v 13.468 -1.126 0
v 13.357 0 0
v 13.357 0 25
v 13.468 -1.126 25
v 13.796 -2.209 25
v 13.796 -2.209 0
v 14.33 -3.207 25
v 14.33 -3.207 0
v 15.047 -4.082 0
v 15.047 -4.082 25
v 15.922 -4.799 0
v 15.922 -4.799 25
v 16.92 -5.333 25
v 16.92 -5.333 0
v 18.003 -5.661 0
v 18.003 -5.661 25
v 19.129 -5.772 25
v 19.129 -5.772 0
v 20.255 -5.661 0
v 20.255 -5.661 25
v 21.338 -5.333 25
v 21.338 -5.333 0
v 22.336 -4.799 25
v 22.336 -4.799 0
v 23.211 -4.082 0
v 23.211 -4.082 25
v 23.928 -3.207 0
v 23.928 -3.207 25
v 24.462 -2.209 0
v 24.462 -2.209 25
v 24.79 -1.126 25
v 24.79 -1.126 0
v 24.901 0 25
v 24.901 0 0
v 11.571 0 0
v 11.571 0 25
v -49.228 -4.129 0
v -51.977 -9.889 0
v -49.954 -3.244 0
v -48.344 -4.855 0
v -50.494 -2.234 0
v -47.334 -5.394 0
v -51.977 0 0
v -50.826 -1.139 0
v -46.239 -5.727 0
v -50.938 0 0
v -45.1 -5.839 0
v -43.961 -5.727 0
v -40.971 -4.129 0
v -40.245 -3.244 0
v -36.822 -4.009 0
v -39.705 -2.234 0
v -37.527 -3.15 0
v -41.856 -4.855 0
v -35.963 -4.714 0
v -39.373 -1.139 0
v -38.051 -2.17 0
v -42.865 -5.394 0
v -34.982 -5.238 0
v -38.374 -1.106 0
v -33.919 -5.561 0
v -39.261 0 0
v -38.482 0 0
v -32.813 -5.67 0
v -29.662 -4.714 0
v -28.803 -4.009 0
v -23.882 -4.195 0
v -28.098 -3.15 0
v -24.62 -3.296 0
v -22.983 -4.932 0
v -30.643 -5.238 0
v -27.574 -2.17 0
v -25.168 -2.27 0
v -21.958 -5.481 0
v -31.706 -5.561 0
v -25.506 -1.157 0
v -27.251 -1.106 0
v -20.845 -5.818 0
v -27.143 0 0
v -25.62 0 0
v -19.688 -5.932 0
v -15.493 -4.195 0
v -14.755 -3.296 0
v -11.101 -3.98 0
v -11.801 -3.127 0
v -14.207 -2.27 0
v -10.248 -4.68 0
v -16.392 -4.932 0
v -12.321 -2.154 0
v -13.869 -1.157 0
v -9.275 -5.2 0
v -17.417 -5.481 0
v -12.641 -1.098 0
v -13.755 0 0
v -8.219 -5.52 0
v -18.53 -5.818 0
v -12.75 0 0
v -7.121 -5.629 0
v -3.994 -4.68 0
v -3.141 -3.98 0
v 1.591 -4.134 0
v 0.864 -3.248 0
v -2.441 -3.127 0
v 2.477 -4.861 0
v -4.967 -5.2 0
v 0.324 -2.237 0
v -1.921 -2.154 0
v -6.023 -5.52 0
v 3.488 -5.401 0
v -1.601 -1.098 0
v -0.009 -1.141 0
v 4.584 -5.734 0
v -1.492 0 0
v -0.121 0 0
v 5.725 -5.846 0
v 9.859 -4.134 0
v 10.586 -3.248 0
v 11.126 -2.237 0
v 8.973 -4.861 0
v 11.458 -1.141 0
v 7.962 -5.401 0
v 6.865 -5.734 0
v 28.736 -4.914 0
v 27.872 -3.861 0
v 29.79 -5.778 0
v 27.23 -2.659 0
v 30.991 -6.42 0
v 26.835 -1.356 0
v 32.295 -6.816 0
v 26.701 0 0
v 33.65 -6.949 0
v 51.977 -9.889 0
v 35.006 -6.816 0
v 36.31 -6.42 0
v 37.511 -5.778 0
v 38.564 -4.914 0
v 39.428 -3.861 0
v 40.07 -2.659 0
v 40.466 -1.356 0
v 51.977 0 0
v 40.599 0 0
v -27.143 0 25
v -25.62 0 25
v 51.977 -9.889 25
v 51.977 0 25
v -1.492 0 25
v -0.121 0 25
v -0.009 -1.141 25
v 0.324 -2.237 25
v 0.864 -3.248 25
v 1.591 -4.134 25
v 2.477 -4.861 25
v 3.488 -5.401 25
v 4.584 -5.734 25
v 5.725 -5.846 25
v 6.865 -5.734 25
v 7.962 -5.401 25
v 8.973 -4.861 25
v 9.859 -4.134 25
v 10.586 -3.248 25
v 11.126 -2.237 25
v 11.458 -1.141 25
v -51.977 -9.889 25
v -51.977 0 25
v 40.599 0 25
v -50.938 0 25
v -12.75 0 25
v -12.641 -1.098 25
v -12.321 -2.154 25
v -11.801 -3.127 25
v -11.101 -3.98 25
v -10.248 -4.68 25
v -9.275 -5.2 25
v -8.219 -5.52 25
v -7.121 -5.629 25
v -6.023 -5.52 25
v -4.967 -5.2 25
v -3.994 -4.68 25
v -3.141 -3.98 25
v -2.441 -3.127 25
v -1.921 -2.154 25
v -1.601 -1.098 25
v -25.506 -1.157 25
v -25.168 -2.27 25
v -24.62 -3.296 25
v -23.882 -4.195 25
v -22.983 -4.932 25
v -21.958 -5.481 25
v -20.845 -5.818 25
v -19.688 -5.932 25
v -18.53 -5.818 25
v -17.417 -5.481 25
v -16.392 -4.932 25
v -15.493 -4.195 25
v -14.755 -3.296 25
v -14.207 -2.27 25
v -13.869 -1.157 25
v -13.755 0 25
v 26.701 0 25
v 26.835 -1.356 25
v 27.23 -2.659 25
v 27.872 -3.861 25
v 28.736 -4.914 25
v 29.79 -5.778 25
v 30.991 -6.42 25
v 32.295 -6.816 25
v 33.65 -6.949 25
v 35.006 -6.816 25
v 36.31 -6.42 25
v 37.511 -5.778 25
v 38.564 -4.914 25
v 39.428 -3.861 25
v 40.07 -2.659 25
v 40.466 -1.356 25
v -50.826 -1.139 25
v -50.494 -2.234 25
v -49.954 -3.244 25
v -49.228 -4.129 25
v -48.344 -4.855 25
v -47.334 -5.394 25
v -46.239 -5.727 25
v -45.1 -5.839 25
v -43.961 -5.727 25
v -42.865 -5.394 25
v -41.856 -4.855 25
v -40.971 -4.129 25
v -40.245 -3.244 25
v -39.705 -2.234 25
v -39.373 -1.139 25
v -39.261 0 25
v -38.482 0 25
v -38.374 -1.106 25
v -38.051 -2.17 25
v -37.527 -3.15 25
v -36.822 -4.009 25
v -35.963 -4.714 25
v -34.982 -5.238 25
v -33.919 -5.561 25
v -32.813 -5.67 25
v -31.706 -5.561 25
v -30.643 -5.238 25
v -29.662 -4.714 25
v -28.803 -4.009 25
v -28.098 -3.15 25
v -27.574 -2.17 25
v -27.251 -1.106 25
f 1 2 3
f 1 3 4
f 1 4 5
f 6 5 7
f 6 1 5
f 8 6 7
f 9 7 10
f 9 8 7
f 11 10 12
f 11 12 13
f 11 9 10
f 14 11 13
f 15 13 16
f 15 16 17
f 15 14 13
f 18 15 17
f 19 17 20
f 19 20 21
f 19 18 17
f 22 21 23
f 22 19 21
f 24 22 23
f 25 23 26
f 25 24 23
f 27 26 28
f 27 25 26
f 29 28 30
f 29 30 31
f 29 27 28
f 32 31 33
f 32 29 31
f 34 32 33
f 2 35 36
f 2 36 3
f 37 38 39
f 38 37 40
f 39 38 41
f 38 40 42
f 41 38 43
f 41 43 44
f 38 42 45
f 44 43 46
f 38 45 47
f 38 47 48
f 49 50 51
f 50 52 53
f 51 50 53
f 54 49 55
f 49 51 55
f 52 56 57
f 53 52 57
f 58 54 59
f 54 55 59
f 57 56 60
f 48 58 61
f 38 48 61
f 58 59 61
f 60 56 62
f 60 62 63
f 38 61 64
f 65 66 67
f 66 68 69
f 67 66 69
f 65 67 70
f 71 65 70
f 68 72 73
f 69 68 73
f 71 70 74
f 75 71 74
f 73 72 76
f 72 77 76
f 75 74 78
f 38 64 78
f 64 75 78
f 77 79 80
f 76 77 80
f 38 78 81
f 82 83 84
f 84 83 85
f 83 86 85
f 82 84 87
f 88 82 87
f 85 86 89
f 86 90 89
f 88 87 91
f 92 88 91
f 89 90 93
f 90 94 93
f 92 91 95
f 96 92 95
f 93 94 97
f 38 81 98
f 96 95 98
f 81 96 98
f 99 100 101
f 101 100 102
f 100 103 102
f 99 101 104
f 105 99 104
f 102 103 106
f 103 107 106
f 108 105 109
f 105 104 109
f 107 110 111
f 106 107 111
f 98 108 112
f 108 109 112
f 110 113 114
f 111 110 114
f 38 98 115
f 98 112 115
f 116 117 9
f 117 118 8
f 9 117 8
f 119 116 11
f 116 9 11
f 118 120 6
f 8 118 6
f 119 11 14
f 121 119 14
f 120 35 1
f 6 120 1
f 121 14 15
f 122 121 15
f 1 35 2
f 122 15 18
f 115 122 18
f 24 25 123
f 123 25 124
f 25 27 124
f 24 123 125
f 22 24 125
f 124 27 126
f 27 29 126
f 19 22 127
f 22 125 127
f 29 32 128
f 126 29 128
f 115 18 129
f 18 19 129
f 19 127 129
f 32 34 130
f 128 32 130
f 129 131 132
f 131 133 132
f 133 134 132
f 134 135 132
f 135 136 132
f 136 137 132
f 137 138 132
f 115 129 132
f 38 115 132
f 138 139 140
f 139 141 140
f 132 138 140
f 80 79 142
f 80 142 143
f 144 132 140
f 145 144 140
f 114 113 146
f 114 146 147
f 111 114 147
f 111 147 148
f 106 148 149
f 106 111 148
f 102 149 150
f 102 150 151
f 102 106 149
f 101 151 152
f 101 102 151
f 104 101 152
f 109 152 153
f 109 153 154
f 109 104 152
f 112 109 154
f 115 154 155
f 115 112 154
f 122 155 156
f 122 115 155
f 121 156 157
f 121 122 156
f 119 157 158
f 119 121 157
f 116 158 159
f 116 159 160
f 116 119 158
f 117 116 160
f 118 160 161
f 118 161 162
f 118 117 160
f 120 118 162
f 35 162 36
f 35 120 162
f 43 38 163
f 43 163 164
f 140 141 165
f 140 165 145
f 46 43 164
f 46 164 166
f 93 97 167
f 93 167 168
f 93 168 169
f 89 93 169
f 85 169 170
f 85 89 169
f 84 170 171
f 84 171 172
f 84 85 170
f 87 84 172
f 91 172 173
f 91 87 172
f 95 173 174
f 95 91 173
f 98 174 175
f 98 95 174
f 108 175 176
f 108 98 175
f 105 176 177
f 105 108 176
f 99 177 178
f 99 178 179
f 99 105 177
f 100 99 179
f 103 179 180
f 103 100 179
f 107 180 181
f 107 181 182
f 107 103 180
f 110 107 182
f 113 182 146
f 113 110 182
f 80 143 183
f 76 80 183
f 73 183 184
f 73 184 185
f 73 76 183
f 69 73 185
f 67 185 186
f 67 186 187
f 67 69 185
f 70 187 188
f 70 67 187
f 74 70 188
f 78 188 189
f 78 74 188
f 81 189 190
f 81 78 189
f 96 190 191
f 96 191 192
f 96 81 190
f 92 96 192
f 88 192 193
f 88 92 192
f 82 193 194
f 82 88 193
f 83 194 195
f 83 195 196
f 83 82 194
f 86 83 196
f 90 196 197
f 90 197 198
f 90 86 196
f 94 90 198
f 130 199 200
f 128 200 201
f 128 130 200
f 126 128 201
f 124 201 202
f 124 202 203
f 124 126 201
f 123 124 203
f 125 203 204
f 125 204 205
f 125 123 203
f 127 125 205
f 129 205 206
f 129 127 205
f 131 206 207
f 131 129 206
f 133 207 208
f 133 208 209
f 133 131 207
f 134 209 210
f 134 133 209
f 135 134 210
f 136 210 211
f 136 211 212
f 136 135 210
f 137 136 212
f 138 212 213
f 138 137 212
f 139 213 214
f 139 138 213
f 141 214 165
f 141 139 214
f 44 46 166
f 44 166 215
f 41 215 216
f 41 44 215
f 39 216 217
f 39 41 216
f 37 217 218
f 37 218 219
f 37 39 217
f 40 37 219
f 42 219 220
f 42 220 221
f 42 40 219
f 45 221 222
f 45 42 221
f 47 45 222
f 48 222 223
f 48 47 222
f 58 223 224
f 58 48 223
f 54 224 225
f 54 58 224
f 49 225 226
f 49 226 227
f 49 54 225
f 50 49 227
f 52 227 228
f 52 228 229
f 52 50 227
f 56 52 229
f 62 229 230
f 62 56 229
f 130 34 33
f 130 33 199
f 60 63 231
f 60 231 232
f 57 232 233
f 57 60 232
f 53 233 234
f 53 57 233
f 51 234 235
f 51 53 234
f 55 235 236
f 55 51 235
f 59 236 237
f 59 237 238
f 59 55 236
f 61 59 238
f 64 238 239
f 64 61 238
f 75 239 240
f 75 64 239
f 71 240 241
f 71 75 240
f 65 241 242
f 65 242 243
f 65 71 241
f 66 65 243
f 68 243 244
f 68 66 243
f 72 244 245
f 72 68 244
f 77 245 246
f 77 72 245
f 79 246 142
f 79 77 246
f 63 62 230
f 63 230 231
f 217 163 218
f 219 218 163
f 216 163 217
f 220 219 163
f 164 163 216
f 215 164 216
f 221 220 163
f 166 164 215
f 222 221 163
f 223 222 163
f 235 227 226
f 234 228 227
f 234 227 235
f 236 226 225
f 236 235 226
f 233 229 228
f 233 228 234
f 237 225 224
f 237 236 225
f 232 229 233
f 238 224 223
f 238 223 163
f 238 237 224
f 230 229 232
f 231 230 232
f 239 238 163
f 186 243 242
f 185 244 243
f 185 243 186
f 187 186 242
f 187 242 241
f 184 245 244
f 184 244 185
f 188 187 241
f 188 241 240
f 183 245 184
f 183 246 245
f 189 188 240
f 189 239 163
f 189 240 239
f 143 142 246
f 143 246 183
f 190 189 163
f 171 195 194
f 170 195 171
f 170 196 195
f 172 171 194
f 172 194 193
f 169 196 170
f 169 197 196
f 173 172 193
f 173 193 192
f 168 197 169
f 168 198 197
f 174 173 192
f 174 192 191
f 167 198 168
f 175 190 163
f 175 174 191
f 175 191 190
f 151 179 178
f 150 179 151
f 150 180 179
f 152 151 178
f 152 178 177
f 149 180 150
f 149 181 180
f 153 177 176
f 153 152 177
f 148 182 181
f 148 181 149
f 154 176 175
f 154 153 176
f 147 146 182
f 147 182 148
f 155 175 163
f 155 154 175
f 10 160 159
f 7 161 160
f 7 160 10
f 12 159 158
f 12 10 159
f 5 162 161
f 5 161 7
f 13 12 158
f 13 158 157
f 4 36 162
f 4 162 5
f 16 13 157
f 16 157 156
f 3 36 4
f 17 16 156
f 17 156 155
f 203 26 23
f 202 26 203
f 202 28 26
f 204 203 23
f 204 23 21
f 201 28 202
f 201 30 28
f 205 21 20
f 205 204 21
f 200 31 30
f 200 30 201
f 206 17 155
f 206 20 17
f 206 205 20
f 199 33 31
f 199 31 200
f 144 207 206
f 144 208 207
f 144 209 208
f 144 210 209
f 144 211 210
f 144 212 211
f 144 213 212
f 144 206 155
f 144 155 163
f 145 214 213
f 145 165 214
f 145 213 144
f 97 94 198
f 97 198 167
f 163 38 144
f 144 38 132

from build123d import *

# Parameters (mm, degrees)
F0_W     = 103.95483
F0_H     = 19.77795
F1_DEPTH = 25
F2_R     = 5.8387
F2_R_2   = 5.669985
F2_R_3   = 5.932122
F2_R_4   = 5.628572
F2_R_5   = 5.846051
F2_R_6   = 5.772215
F2_R_7   = 6.949194
F3_DEPTH = 25
F4_W     = 109.984688
F4_H     = 10.371363
F5_DEPTH = 25


with BuildPart() as f1:
    # F0 (on Top) → F1 (new body)
    with BuildSketch(Plane.XY):
        Rectangle(F0_W, F0_H)
    extrude(amount=F1_DEPTH)

    # F2 (on Top) → F3 (cut)
    with BuildSketch(Plane.XY):
        with Locations((-45.099735, 0)):
            Circle(F2_R)
        with Locations((-32.812502, 0)):
            Circle(F2_R_2)
        with Locations((-19.687502, 0)):
            Circle(F2_R_3)
        with Locations((-7.12101, 0)):
            Circle(F2_R_4)
        with Locations((5.724736, 0)):
            Circle(F2_R_5)
        with Locations((19.128991, 0)):
            Circle(F2_R_6)
        with Locations((33.650268, 0)):
            Circle(F2_R_7)
    extrude(amount=F3_DEPTH, mode=Mode.SUBTRACT)

    # F4 (on Top) → F5 (cut)
    with BuildSketch(Plane.XY):
        with Locations((2.050154, 5.185681)):
            Rectangle(F4_W, F4_H)
    extrude(amount=F5_DEPTH, mode=Mode.SUBTRACT)


solid = f1.part
